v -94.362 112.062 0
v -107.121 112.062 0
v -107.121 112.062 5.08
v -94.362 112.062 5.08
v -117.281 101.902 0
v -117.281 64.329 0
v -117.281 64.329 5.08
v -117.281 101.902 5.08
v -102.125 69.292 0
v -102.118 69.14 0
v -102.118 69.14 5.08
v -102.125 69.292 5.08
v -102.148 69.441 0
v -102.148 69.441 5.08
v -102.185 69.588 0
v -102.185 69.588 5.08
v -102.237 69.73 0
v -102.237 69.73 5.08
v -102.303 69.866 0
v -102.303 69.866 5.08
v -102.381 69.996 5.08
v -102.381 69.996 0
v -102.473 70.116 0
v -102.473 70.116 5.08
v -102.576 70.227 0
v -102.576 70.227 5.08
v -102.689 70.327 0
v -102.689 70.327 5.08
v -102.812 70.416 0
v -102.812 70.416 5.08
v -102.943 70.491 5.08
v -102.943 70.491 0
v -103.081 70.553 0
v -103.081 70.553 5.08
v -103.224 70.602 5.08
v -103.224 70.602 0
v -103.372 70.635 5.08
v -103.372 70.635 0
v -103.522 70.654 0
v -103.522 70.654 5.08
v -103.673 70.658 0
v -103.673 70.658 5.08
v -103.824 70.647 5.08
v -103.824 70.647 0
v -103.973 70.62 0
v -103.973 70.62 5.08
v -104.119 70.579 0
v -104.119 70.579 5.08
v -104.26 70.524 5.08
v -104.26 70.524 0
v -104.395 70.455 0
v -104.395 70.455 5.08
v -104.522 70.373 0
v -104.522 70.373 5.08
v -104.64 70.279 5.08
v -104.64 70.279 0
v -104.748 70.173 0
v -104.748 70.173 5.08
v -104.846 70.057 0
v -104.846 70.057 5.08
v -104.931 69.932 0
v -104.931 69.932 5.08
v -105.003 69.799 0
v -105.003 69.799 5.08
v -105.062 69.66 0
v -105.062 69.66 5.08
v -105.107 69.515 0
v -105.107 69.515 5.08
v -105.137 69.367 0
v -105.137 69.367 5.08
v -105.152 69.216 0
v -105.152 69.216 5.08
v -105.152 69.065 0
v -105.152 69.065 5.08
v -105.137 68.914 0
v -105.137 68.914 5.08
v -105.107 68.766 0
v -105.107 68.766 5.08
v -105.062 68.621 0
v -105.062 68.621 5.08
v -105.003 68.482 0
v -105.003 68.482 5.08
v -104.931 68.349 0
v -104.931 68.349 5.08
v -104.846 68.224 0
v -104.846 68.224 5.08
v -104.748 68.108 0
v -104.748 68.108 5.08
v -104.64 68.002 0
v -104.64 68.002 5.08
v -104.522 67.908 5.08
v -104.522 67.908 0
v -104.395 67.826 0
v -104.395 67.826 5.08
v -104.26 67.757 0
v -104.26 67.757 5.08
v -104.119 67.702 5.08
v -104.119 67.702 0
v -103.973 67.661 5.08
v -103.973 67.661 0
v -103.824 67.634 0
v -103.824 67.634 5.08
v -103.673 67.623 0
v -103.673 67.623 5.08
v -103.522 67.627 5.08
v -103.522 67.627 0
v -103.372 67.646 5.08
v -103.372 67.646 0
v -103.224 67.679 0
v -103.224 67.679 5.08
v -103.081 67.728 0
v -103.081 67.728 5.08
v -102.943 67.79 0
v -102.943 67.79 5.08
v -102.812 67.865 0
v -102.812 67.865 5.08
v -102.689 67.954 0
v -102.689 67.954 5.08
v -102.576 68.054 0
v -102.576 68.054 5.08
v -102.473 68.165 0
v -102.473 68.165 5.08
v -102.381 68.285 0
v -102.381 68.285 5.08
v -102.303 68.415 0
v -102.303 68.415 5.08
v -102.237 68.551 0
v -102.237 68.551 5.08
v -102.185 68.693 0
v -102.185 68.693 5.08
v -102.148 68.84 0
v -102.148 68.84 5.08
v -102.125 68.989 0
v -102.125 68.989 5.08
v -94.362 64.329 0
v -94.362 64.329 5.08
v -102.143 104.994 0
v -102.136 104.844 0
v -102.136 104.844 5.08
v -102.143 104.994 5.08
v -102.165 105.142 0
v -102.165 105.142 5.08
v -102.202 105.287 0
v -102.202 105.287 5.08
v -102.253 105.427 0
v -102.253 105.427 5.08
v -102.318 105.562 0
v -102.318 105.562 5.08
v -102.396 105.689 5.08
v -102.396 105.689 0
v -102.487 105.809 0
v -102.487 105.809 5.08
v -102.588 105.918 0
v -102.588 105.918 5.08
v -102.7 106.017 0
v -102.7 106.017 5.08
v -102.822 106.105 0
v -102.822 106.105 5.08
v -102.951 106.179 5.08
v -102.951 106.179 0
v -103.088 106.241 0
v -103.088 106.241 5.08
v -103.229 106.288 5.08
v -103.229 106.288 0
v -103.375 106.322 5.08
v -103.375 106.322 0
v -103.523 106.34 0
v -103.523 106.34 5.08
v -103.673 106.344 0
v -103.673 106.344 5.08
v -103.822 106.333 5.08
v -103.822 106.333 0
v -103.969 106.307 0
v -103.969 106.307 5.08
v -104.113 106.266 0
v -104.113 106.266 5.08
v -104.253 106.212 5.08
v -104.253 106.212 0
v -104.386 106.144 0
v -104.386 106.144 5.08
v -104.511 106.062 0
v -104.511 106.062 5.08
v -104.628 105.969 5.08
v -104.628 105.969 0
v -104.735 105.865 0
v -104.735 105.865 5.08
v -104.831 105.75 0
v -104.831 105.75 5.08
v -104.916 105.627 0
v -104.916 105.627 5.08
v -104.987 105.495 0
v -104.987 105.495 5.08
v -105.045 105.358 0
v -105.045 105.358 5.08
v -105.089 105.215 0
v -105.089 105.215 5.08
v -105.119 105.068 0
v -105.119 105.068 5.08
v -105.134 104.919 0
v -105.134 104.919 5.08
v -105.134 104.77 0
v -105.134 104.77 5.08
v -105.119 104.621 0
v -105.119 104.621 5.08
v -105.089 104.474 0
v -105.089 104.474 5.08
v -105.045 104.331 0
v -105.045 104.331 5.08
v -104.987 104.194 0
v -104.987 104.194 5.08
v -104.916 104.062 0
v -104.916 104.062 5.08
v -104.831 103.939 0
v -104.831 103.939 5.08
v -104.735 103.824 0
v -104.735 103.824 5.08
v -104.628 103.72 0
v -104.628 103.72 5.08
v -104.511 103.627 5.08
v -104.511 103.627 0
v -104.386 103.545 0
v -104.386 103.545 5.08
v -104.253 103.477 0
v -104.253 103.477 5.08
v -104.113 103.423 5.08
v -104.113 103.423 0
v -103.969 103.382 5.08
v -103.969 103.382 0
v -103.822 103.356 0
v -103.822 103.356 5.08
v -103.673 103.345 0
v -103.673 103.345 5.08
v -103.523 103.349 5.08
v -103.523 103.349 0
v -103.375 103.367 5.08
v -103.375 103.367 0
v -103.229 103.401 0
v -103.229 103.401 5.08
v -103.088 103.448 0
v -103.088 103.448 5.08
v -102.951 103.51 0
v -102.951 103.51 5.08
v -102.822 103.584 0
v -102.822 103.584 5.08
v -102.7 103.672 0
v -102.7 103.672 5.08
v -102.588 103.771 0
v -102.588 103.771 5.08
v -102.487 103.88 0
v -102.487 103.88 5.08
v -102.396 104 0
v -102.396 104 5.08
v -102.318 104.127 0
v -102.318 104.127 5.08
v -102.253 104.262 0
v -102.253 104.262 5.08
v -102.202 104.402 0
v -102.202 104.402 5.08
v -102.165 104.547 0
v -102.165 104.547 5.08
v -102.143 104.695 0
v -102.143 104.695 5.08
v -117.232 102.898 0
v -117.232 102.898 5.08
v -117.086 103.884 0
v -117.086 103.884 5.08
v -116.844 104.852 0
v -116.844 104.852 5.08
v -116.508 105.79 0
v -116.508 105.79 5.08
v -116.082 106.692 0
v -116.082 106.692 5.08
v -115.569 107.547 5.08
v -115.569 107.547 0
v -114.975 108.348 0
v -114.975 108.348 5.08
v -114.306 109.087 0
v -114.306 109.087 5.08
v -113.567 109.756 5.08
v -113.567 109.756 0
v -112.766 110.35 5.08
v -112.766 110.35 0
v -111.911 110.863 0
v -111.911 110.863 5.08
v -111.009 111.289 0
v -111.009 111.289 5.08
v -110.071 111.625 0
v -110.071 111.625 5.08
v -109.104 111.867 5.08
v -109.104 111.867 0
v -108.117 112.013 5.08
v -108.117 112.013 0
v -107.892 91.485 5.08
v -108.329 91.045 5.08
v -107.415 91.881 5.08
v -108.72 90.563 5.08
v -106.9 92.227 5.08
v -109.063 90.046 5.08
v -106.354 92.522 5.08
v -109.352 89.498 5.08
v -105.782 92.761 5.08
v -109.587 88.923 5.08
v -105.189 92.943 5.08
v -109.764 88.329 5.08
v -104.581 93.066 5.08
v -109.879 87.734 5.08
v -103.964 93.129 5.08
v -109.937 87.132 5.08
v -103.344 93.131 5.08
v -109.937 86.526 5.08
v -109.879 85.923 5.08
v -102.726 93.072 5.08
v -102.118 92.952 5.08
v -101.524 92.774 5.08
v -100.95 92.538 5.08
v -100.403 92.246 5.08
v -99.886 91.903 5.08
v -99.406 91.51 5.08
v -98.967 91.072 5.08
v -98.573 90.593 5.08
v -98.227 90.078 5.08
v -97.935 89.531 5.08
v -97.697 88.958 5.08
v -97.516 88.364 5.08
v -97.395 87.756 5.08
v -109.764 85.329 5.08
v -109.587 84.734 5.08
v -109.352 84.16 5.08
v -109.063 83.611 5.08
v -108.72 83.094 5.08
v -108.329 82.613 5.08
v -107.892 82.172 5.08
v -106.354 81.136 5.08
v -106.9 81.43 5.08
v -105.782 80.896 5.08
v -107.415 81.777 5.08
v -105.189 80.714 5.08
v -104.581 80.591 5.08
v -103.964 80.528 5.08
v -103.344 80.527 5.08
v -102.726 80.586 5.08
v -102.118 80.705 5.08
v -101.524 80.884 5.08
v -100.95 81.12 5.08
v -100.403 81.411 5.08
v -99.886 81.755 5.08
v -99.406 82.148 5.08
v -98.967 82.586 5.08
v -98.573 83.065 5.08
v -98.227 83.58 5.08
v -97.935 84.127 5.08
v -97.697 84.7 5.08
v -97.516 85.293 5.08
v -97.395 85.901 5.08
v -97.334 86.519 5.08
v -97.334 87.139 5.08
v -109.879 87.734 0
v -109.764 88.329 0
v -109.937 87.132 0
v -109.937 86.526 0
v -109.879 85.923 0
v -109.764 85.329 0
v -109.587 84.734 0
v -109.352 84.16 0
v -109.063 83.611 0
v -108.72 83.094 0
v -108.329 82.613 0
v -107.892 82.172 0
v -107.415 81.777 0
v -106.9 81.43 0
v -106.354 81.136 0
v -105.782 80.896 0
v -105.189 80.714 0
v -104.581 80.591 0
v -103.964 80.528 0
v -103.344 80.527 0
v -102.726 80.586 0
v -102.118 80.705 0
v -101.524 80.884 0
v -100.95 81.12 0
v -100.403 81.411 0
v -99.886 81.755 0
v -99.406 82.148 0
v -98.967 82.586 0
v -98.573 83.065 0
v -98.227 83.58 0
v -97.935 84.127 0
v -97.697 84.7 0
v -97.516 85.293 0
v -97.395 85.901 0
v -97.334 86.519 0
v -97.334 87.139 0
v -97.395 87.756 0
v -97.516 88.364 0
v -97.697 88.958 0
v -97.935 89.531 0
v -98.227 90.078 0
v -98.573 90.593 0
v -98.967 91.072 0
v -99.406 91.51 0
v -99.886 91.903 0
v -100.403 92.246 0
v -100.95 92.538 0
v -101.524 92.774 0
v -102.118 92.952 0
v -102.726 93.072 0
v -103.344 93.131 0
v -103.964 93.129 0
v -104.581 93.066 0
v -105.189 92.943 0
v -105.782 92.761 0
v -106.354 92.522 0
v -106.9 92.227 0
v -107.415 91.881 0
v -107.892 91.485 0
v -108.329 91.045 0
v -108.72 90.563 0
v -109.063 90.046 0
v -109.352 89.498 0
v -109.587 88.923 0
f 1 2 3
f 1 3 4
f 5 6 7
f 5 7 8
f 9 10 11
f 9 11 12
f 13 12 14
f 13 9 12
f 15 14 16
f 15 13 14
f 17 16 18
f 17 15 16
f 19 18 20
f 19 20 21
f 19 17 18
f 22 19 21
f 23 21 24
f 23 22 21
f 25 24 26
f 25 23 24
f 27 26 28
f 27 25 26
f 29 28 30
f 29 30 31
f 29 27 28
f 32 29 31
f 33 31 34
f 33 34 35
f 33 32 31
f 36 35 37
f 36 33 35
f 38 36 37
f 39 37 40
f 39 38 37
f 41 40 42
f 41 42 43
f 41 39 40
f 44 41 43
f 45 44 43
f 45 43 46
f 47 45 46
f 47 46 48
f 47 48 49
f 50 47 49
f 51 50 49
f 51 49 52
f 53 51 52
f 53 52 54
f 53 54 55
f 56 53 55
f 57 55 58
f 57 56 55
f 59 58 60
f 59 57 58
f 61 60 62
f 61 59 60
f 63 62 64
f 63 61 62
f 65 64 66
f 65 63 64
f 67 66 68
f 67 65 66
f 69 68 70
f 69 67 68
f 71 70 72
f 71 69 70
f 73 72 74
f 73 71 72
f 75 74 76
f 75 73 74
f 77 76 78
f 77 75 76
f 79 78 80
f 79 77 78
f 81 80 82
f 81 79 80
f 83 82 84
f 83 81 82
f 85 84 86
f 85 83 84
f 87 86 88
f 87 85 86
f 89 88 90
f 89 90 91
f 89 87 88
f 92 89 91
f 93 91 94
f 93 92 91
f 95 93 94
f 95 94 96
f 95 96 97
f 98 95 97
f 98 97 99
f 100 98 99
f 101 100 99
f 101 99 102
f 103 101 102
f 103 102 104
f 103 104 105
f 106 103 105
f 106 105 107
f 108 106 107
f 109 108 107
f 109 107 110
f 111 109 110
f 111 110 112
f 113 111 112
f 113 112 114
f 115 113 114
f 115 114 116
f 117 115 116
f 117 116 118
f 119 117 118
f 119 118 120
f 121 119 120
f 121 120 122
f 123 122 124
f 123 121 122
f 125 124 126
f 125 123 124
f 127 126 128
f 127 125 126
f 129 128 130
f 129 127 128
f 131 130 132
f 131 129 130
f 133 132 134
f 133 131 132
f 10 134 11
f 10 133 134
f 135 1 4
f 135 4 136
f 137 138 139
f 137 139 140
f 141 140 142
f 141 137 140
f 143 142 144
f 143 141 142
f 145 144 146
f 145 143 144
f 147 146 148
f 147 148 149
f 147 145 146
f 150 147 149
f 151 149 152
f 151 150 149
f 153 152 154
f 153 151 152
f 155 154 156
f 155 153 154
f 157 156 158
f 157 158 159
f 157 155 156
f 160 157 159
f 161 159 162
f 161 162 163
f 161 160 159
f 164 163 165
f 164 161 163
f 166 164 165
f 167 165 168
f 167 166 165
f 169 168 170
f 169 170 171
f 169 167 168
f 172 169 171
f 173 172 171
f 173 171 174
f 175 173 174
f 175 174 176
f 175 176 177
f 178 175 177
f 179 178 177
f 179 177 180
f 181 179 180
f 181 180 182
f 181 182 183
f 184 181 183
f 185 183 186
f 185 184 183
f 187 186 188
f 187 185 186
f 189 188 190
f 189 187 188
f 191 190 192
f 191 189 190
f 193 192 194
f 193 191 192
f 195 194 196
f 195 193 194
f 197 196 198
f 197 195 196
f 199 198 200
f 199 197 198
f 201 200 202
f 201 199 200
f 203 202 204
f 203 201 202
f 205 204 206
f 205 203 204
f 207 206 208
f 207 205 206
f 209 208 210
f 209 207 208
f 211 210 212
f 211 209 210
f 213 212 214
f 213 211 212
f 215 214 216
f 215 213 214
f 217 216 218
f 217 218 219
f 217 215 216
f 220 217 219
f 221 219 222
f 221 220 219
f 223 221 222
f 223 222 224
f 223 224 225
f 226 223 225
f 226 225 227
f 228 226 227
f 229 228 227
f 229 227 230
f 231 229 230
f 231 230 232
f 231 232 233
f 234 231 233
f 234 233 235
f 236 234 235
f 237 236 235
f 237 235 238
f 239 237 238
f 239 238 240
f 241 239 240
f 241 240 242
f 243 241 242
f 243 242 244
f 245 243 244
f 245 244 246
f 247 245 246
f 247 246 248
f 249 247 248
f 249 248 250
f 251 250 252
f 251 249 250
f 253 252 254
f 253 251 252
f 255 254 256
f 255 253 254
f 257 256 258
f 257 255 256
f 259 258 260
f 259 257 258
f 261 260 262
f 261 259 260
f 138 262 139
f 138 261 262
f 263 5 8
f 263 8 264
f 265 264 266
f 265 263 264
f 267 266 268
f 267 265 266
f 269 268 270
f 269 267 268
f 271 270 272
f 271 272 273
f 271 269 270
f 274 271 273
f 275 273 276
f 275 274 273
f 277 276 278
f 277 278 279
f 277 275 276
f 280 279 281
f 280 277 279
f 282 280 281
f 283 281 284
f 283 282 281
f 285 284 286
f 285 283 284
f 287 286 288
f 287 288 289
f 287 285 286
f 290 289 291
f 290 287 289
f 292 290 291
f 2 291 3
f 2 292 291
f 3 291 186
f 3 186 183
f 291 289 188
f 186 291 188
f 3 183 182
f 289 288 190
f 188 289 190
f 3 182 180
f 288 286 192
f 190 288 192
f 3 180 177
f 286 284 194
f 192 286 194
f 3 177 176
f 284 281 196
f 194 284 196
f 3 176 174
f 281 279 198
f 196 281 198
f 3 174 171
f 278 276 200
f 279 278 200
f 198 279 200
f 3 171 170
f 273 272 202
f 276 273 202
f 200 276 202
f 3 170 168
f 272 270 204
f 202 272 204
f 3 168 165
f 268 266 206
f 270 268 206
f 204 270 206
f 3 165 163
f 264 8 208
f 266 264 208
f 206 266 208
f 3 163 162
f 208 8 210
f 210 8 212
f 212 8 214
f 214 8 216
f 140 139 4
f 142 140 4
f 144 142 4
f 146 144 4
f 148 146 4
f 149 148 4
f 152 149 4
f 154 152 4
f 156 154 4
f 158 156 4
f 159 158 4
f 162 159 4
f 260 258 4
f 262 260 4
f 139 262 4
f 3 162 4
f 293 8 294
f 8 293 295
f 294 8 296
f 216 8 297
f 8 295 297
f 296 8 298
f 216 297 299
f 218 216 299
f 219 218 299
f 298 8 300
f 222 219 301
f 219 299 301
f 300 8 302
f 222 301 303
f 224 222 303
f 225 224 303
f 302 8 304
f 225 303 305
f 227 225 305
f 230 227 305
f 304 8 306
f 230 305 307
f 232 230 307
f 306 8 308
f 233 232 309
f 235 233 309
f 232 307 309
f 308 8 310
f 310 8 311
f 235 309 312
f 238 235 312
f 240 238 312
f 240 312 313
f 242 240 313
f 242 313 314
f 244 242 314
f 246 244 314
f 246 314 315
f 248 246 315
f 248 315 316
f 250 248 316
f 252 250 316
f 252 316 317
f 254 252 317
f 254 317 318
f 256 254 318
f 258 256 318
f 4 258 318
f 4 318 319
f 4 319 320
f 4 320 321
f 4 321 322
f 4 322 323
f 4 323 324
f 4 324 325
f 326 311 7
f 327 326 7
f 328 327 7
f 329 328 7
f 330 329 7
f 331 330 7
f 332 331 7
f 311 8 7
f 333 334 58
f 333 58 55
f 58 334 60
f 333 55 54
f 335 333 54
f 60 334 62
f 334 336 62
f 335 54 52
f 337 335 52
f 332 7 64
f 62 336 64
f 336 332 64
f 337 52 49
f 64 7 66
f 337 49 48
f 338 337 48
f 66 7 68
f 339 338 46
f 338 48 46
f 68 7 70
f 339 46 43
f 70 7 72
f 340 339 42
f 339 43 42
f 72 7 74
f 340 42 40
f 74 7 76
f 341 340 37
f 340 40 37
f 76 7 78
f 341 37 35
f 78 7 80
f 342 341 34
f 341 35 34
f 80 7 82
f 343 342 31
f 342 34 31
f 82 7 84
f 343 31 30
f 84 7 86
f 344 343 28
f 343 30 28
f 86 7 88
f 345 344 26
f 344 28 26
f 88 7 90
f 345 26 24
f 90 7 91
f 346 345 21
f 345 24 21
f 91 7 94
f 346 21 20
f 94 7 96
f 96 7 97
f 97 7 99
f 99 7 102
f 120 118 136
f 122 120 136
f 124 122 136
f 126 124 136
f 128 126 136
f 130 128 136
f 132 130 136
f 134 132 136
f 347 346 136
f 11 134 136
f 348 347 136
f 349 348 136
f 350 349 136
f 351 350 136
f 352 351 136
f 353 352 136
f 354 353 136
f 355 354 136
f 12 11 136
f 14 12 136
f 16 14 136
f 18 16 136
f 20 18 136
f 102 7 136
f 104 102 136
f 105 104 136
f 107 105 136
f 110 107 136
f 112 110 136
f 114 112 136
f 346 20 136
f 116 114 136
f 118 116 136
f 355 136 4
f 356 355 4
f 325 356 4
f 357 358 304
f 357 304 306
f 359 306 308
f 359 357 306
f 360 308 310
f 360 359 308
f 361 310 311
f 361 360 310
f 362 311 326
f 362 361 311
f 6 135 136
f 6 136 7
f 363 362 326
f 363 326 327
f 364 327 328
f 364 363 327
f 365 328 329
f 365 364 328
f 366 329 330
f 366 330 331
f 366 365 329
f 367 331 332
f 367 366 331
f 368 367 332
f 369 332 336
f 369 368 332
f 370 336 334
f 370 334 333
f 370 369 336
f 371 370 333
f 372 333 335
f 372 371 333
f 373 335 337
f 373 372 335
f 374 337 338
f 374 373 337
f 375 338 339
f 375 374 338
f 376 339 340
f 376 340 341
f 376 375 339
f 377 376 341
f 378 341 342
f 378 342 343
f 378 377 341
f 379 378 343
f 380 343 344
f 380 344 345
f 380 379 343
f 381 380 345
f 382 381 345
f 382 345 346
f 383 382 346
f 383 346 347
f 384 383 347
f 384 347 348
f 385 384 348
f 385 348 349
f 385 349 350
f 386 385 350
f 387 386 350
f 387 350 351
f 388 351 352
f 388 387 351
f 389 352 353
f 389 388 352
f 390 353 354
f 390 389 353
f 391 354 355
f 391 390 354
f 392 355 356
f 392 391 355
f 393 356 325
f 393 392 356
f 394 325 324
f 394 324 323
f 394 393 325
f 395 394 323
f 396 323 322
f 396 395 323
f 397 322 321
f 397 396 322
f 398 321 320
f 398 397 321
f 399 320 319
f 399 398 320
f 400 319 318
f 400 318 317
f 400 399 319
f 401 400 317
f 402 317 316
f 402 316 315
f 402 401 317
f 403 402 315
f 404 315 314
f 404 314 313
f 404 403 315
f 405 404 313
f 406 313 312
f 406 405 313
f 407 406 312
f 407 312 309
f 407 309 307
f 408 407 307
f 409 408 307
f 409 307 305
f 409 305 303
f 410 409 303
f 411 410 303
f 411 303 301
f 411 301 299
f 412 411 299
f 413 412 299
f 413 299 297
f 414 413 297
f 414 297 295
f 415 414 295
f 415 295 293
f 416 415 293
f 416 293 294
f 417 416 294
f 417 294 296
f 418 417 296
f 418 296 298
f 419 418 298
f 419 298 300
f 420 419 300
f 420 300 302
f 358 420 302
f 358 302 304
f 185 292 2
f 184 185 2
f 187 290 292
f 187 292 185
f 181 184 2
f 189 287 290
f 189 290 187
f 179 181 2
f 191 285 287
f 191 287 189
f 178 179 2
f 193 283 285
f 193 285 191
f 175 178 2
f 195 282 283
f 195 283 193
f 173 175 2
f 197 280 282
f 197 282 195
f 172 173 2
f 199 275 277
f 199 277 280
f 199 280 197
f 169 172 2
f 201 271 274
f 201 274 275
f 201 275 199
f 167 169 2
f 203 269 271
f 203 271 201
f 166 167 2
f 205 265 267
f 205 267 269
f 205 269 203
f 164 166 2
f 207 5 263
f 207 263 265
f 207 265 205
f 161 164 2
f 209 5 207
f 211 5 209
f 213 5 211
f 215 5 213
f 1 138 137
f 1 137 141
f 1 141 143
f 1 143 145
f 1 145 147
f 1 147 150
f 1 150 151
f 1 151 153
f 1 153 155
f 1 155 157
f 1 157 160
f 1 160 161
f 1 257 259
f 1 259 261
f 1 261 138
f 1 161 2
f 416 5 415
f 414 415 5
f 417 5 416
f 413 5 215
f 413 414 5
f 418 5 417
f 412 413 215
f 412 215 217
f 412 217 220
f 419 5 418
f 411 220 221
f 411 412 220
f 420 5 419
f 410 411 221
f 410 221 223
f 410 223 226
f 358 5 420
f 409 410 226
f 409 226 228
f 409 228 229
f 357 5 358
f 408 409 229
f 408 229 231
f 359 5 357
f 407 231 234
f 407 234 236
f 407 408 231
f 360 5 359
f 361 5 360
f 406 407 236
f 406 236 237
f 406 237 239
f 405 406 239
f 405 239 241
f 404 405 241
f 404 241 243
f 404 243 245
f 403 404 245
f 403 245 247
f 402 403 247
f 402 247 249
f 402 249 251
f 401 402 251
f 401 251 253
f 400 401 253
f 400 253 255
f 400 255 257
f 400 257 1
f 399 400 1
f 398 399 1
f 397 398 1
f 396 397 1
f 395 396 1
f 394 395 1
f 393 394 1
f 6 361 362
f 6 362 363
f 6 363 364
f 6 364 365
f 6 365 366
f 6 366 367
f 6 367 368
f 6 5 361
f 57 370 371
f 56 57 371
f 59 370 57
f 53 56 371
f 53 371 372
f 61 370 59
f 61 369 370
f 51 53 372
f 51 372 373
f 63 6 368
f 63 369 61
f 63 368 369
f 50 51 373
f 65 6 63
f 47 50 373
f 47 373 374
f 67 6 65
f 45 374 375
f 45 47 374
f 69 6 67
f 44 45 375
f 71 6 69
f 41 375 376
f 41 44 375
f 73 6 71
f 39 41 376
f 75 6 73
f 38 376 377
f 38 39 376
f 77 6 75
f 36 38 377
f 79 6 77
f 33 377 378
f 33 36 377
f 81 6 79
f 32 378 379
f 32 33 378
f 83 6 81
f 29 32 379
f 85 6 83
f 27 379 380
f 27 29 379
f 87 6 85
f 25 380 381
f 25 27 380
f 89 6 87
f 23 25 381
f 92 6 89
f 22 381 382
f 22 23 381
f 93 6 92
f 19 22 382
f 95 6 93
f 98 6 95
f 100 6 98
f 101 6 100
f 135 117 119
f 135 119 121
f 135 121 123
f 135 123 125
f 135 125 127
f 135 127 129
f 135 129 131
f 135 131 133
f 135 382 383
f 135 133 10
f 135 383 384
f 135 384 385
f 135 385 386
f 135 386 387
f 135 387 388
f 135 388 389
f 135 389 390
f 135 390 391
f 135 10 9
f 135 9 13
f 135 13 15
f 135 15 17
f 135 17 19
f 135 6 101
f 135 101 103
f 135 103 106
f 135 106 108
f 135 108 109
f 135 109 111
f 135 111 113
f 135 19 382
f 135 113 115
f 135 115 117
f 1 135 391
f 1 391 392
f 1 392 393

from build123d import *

# Parameters (mm, degrees)
SKETCH1_R           = 1.5
SKETCH1_R_2         = 1.517913389
BOSS_EXTRUDE1_DEPTH = 5.08


with BuildPart() as part:
    # Sketch1 → Boss-Extrude1 (new body)
    with BuildSketch(Plane(origin=(0, 0, 0), x_dir=(-1, 0, 0), z_dir=(0, 0, 1))):
        with BuildLine():
            Line((94.361674585, -64.328592097), (94.361674585, -111.794978321))
            Line((94.361674585, -111.794978321), (94.361674585, -112.062374013))
            Line((94.361674585, -112.062374013), (107.121412131, -112.062374013))
            ThreePointArc((107.121412131, -112.062374013), (114.305617027, -109.08657891), (117.281412131, -101.902374013))
            Line((117.281412131, -101.902374013), (117.281412131, -64.328592097))
            Line((117.281412131, -64.328592097), (94.361674585, -64.328592097))
        make_face()
        with Locations((103.635582515, -104.844491412)):
            Circle(SKETCH1_R, mode=Mode.SUBTRACT)
        with BuildLine():
            ThreePointArc((109.76359006, -88.328738191), (97.326662127, -86.828738191), (109.76359006, -85.328738191))
            ThreePointArc((109.76359006, -85.328738191), (109.944502904, -86.828738191), (109.76359006, -88.328738191))
        make_face(mode=Mode.SUBTRACT)
        with Locations((103.635582515, -69.140487693)):
            Circle(SKETCH1_R_2, mode=Mode.SUBTRACT)
    extrude(amount=BOSS_EXTRUDE1_DEPTH)


solid = part.part
